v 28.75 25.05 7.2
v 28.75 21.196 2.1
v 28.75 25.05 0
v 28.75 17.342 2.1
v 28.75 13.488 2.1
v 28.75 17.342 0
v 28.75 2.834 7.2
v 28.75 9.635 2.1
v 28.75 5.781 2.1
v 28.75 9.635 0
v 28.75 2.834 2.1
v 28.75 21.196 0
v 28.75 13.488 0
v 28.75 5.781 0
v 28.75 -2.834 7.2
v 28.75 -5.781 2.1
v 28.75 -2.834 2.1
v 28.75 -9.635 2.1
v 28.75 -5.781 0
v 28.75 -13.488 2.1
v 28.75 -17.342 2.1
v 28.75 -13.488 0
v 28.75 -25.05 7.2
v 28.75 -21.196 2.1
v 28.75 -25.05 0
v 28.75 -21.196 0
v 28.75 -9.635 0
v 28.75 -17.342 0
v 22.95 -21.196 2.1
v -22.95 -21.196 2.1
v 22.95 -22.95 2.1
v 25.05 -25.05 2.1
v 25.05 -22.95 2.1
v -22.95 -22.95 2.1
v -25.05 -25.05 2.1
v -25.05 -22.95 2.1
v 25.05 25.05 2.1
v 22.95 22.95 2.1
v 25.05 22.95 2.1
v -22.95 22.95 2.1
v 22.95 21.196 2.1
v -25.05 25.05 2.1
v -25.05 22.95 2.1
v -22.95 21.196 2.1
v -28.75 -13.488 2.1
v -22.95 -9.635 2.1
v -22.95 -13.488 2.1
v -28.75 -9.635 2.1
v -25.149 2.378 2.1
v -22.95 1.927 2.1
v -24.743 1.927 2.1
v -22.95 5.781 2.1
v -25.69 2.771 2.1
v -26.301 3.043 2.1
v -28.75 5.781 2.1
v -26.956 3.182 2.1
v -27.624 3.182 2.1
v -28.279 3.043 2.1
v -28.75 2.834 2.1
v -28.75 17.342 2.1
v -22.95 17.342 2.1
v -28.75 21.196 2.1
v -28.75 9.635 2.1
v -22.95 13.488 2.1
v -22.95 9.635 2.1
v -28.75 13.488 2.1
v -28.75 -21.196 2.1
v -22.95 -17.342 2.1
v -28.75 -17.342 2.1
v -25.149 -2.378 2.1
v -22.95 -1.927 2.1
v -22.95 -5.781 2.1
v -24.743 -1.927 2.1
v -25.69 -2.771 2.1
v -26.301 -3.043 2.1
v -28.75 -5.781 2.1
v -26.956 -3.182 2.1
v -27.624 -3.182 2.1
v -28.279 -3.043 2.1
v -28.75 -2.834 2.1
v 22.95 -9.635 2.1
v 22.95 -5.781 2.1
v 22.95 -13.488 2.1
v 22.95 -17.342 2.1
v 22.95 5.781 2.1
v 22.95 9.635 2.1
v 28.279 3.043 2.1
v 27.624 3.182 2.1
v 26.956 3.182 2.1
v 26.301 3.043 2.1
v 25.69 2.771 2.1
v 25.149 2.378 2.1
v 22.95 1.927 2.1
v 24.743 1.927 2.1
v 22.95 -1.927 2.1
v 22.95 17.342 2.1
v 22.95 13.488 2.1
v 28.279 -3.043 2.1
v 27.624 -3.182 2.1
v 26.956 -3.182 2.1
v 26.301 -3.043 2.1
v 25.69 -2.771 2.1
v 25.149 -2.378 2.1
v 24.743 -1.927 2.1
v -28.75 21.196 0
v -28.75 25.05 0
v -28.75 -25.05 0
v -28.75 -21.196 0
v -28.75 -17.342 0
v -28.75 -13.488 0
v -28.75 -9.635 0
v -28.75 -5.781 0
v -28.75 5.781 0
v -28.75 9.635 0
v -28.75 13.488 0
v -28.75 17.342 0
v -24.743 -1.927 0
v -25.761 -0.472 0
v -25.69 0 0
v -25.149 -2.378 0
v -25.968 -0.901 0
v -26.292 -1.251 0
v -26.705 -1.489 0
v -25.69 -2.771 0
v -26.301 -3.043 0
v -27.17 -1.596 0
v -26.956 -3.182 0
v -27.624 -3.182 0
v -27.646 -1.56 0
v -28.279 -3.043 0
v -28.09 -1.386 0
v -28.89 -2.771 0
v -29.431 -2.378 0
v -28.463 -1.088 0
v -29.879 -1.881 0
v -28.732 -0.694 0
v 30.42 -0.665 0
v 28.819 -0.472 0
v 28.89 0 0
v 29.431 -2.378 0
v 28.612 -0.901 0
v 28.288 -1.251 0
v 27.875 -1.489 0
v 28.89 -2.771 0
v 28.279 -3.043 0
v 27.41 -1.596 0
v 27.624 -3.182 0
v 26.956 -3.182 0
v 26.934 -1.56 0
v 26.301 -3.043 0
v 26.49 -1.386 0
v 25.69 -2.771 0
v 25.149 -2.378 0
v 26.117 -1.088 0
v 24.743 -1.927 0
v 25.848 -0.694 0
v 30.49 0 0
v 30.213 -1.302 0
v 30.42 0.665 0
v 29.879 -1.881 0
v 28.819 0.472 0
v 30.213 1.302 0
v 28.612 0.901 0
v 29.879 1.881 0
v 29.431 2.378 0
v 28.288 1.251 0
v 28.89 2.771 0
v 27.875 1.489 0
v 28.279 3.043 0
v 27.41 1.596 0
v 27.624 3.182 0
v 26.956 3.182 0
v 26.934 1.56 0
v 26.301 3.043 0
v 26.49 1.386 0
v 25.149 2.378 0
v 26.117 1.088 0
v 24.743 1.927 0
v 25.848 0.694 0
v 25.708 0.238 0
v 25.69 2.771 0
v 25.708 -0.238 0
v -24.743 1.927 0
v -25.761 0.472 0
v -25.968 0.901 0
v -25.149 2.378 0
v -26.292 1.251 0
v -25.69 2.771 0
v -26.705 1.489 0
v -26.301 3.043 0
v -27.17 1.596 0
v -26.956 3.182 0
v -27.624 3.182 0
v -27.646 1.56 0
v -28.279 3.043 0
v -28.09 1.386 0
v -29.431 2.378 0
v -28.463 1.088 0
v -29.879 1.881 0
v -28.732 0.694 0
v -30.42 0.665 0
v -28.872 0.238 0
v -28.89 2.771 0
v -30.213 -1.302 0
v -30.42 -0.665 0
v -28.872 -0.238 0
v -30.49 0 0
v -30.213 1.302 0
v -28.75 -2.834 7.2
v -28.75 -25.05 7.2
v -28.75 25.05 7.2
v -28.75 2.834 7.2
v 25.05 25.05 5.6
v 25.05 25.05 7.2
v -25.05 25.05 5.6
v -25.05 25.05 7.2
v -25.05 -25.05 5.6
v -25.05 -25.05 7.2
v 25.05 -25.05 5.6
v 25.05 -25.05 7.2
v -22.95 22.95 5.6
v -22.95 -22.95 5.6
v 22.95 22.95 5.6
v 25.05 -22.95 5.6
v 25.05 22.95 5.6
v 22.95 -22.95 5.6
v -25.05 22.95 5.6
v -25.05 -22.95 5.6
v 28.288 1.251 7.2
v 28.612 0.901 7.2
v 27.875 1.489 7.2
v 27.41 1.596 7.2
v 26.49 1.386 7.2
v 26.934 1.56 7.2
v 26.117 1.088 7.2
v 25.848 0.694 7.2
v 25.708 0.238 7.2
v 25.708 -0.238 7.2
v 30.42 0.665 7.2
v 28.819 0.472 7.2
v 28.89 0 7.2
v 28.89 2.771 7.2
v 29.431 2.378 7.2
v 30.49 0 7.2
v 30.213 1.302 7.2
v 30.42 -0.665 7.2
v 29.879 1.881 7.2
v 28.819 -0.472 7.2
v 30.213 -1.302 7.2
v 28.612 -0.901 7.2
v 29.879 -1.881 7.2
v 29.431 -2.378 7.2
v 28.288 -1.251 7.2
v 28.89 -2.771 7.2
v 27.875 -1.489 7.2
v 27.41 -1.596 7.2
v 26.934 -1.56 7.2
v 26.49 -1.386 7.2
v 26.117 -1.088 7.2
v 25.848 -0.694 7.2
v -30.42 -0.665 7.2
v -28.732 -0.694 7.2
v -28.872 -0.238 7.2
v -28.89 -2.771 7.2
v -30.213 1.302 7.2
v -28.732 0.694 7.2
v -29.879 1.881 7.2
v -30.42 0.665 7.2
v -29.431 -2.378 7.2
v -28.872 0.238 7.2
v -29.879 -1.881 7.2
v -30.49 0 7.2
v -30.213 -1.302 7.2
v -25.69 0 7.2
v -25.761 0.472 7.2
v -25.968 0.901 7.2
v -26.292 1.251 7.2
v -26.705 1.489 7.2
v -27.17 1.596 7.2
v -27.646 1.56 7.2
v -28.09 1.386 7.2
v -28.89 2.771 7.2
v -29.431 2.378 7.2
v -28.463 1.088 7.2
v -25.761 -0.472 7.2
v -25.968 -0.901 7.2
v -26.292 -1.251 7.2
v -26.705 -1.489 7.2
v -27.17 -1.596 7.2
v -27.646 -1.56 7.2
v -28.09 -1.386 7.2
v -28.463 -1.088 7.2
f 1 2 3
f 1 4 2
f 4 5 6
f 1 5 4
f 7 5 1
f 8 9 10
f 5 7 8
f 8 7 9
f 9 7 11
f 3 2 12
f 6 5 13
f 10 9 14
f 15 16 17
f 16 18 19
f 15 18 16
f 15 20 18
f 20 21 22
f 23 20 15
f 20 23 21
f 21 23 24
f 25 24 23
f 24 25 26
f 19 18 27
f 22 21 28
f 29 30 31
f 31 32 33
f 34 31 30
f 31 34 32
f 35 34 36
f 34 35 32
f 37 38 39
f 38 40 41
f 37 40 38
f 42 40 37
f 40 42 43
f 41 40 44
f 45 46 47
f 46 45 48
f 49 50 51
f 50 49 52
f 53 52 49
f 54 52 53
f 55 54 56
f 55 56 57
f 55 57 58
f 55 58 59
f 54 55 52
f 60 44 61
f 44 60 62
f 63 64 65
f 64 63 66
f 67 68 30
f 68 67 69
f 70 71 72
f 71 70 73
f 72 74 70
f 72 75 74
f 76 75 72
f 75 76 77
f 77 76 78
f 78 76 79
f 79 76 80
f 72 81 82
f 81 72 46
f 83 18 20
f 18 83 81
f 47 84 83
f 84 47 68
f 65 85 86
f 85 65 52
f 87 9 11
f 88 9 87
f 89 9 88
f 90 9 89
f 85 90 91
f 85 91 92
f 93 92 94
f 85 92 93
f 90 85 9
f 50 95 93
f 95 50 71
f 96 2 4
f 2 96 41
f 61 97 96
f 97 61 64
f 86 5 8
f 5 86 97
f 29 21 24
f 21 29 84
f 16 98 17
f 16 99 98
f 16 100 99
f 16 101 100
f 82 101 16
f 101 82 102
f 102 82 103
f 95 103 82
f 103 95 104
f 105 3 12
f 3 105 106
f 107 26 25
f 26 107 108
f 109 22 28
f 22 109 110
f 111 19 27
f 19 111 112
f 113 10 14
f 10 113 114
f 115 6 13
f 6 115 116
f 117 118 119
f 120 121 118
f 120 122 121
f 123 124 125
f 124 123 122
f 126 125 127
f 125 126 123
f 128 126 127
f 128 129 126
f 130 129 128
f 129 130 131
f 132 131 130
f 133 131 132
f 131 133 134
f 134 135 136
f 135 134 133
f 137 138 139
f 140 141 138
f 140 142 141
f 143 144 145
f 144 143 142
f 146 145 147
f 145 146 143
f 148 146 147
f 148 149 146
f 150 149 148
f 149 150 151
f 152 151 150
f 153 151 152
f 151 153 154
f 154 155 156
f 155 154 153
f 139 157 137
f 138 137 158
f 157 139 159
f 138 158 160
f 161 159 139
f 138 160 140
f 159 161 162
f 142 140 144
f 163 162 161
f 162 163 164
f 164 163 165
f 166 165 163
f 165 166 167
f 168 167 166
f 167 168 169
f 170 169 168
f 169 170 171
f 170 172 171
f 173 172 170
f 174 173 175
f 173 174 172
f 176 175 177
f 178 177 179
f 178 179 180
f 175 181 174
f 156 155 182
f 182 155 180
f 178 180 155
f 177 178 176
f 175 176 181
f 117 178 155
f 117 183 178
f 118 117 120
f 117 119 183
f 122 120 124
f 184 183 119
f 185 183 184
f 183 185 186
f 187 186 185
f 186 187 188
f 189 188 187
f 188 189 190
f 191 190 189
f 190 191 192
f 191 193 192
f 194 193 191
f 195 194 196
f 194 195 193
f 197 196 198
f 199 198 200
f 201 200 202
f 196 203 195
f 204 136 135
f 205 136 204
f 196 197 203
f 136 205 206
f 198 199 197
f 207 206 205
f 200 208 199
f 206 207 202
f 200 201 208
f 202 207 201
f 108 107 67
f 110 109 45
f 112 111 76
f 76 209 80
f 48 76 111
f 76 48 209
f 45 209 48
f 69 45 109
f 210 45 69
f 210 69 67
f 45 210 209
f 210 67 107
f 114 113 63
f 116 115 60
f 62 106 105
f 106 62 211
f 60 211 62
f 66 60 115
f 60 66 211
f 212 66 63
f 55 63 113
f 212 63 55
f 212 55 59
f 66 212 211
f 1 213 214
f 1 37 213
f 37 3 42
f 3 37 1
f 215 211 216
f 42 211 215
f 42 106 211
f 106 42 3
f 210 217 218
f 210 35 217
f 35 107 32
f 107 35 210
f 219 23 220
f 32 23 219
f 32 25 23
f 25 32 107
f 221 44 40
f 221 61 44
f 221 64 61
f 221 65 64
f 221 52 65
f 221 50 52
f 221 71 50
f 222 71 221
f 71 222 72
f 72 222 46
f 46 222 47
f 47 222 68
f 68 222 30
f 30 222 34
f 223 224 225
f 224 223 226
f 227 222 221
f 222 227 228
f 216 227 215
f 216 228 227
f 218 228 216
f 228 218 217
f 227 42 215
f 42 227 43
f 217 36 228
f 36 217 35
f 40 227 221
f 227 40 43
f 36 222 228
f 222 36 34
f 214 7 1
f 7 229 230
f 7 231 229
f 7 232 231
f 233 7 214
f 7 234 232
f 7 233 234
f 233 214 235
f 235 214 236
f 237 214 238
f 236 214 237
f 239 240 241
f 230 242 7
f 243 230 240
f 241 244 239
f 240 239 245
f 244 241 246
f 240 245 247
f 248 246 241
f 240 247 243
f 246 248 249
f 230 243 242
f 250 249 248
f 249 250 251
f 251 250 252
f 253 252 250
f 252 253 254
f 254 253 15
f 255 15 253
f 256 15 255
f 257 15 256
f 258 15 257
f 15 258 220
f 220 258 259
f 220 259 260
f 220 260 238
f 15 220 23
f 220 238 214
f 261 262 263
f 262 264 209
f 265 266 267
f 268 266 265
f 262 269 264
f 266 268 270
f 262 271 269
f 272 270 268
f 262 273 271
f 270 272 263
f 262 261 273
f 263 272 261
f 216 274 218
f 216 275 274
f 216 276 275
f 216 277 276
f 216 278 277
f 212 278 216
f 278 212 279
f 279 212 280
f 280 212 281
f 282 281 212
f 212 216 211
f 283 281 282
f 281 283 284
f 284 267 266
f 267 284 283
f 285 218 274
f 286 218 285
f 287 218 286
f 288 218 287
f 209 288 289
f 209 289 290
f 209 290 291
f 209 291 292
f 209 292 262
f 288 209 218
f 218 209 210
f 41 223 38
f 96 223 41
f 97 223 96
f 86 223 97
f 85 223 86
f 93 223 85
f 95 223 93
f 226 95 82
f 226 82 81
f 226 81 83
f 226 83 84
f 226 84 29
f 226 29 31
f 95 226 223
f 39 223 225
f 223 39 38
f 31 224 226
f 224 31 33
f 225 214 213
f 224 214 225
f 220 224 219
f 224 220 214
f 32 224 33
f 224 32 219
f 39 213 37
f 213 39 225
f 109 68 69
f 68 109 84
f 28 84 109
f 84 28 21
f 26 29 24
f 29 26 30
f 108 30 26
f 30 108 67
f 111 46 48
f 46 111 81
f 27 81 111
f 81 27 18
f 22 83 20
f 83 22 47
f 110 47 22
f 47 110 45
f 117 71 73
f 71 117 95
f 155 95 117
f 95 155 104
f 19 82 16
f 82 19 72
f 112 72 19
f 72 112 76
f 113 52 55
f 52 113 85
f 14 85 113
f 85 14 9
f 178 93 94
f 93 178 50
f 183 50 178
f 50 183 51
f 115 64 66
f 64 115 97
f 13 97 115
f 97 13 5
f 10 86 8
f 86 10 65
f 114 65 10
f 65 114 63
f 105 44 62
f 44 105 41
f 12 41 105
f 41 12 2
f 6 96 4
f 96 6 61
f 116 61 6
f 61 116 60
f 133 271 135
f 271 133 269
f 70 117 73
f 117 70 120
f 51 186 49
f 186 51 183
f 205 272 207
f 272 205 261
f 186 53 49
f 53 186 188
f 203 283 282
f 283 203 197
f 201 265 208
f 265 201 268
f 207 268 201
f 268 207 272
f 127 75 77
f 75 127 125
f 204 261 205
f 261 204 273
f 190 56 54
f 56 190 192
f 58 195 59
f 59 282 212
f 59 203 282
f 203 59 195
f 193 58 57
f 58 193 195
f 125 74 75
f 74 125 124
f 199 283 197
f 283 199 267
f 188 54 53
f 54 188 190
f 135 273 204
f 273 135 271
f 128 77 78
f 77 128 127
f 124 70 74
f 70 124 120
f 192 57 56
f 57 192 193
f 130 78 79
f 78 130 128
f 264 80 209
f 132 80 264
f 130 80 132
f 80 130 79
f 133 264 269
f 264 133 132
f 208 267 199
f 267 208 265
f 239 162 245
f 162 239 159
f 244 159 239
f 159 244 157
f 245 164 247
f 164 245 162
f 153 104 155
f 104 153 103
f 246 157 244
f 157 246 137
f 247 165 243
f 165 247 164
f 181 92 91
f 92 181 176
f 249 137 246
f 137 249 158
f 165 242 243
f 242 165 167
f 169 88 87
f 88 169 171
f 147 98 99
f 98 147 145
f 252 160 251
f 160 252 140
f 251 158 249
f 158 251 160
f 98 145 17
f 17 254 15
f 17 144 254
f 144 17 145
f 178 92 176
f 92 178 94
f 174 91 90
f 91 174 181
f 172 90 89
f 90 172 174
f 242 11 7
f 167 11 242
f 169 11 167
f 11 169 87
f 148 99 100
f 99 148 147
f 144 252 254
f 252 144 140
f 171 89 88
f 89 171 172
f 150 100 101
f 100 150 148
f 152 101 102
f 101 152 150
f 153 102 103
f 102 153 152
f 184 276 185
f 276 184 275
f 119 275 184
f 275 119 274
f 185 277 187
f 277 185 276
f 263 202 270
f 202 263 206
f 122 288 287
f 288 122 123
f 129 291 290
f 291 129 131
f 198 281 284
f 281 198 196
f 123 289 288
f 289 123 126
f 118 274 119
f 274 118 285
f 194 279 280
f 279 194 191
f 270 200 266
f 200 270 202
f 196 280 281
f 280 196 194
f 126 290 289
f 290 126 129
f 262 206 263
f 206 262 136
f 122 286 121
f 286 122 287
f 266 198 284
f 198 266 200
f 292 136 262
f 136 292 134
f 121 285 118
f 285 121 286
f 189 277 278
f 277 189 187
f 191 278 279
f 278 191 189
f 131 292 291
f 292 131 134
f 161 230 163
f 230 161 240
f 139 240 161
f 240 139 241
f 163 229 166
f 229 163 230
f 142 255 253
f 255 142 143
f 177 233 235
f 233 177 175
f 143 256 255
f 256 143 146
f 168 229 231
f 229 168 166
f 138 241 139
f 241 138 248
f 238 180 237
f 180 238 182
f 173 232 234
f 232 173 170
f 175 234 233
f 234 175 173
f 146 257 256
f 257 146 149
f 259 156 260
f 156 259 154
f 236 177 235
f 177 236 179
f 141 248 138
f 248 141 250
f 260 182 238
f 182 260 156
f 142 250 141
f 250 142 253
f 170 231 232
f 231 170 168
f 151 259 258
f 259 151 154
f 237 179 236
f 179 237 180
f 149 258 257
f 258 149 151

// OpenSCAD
// Width of the PCB
pcb_width = 50.1;

// Length of the PCB
pcb_length = 50.1;

// PCB thickness
pcb_thickness = 1.6;

// Height from top of baseplate to bottom of PCB
pcb_heigth_offset = 3.5;

// Thickness of base plate
baseplate_thickness = 2.1;

// Thickness of the ledge that supports the PCB
pcb_support_width = 2.1;

pcb_support_clear_corner = 2.1;

// Thickness of the ridge that keeps the PCB
ridge_width = 3.7;

// number of slats cut out of baseplate
num_slats = 6;

sides = "none"; // ["none", "front", "back", "both"]

// number of PCB retainment screws per side
num_pcb_retainment_screws_per_side = 1;

// diameter of the PCB retainment screw hole
pcb_retainment_screws_hole_diameter = 3.2;

print_part();

num_sides = (sides == "both") ? 2 : ((sides == "front" || sides == "back") ? 1 : 0);
total_width = pcb_width + 2 * ridge_width;
total_length = pcb_length + num_sides * ridge_width;
retainment_screw_x_offset = .3 * pcb_retainment_screws_hole_diameter;

module screw_body(x, y, diameter, cutout=false) {
    h = baseplate_thickness + pcb_heigth_offset + pcb_thickness;
    dim = cutout ? diameter / 2 : diameter;
    translate([x, y, 0]) 
        cylinder(h,  dim, dim, $fs=.5);
}

module retainment_screws(cutout=false) {
  screw_inc = pcb_length / num_pcb_retainment_screws_per_side;
  x_offset = pcb_retainment_screws_hole_diameter - retainment_screw_x_offset;
  for (i = [1:num_pcb_retainment_screws_per_side]) {
    y = num_pcb_retainment_screws_per_side == 1 ? pcb_length / 2 : (i - .5) * screw_inc;
    screw_body(ridge_width - x_offset, y, pcb_retainment_screws_hole_diameter, cutout);
    screw_body(pcb_width + ridge_width + x_offset, y, pcb_retainment_screws_hole_diameter, cutout);
    }
}

module holder_base() {
    
    // baseplate
    cube([total_width, pcb_length, baseplate_thickness]);
    
    // draw left support
    translate([ridge_width, pcb_support_clear_corner, baseplate_thickness]) 
        cube([pcb_support_width, pcb_length - 2 * pcb_support_clear_corner, pcb_heigth_offset]);
    // draw left ridge
    translate([0, 0, baseplate_thickness]) 
        cube([ridge_width, pcb_length, pcb_heigth_offset + pcb_thickness]);

    // draw right support
    translate([pcb_width - pcb_support_width + ridge_width, pcb_support_clear_corner, baseplate_thickness]) 
      cube([pcb_support_width + ridge_width, pcb_length - 2 * pcb_support_clear_corner, pcb_heigth_offset]);
    // draw right ridge
    translate([pcb_width + ridge_width, 0, baseplate_thickness]) 
      cube([ridge_width, pcb_length, pcb_heigth_offset + pcb_thickness]);
    
    // draw sides
    if (sides == "front" || sides == "both") {
        translate([0, -ridge_width, 0]) 
            cube([total_width, ridge_width, baseplate_thickness + pcb_heigth_offset + pcb_thickness]);
    }
    if (sides == "back" || sides == "both") {
        translate([0, pcb_length, 0]) 
            cube([total_width, ridge_width, baseplate_thickness + pcb_heigth_offset + pcb_thickness]);
    }

}

module holder_slats_cutout() {
    if(num_slats > 0) {
        slat_inc = pcb_length / (2 * num_slats + 1);
        echo(slat_inc=slat_inc);
        for (i = [1:num_slats]) {
            y = (2 * (i - 1) + 1) * slat_inc;
            translate([0, y, 0])
                cube([pcb_width + 2 * pcb_support_width + 2 * ridge_width, slat_inc, baseplate_thickness]);
        }
    }
}

module pcb_cutout() {
    translate([ridge_width, 0, baseplate_thickness + pcb_heigth_offset]) 
        cube([pcb_width, pcb_length, pcb_thickness]);
}

module holder() {    
    difference() {
        union() {
            difference(){
              holder_base();
              holder_slats_cutout();
            }
          retainment_screws();
        }
        retainment_screws(true);
        pcb_cutout();
    }
}

module print_part() {
    translate([-total_width/2, -total_length /2, 0]) holder();
}
